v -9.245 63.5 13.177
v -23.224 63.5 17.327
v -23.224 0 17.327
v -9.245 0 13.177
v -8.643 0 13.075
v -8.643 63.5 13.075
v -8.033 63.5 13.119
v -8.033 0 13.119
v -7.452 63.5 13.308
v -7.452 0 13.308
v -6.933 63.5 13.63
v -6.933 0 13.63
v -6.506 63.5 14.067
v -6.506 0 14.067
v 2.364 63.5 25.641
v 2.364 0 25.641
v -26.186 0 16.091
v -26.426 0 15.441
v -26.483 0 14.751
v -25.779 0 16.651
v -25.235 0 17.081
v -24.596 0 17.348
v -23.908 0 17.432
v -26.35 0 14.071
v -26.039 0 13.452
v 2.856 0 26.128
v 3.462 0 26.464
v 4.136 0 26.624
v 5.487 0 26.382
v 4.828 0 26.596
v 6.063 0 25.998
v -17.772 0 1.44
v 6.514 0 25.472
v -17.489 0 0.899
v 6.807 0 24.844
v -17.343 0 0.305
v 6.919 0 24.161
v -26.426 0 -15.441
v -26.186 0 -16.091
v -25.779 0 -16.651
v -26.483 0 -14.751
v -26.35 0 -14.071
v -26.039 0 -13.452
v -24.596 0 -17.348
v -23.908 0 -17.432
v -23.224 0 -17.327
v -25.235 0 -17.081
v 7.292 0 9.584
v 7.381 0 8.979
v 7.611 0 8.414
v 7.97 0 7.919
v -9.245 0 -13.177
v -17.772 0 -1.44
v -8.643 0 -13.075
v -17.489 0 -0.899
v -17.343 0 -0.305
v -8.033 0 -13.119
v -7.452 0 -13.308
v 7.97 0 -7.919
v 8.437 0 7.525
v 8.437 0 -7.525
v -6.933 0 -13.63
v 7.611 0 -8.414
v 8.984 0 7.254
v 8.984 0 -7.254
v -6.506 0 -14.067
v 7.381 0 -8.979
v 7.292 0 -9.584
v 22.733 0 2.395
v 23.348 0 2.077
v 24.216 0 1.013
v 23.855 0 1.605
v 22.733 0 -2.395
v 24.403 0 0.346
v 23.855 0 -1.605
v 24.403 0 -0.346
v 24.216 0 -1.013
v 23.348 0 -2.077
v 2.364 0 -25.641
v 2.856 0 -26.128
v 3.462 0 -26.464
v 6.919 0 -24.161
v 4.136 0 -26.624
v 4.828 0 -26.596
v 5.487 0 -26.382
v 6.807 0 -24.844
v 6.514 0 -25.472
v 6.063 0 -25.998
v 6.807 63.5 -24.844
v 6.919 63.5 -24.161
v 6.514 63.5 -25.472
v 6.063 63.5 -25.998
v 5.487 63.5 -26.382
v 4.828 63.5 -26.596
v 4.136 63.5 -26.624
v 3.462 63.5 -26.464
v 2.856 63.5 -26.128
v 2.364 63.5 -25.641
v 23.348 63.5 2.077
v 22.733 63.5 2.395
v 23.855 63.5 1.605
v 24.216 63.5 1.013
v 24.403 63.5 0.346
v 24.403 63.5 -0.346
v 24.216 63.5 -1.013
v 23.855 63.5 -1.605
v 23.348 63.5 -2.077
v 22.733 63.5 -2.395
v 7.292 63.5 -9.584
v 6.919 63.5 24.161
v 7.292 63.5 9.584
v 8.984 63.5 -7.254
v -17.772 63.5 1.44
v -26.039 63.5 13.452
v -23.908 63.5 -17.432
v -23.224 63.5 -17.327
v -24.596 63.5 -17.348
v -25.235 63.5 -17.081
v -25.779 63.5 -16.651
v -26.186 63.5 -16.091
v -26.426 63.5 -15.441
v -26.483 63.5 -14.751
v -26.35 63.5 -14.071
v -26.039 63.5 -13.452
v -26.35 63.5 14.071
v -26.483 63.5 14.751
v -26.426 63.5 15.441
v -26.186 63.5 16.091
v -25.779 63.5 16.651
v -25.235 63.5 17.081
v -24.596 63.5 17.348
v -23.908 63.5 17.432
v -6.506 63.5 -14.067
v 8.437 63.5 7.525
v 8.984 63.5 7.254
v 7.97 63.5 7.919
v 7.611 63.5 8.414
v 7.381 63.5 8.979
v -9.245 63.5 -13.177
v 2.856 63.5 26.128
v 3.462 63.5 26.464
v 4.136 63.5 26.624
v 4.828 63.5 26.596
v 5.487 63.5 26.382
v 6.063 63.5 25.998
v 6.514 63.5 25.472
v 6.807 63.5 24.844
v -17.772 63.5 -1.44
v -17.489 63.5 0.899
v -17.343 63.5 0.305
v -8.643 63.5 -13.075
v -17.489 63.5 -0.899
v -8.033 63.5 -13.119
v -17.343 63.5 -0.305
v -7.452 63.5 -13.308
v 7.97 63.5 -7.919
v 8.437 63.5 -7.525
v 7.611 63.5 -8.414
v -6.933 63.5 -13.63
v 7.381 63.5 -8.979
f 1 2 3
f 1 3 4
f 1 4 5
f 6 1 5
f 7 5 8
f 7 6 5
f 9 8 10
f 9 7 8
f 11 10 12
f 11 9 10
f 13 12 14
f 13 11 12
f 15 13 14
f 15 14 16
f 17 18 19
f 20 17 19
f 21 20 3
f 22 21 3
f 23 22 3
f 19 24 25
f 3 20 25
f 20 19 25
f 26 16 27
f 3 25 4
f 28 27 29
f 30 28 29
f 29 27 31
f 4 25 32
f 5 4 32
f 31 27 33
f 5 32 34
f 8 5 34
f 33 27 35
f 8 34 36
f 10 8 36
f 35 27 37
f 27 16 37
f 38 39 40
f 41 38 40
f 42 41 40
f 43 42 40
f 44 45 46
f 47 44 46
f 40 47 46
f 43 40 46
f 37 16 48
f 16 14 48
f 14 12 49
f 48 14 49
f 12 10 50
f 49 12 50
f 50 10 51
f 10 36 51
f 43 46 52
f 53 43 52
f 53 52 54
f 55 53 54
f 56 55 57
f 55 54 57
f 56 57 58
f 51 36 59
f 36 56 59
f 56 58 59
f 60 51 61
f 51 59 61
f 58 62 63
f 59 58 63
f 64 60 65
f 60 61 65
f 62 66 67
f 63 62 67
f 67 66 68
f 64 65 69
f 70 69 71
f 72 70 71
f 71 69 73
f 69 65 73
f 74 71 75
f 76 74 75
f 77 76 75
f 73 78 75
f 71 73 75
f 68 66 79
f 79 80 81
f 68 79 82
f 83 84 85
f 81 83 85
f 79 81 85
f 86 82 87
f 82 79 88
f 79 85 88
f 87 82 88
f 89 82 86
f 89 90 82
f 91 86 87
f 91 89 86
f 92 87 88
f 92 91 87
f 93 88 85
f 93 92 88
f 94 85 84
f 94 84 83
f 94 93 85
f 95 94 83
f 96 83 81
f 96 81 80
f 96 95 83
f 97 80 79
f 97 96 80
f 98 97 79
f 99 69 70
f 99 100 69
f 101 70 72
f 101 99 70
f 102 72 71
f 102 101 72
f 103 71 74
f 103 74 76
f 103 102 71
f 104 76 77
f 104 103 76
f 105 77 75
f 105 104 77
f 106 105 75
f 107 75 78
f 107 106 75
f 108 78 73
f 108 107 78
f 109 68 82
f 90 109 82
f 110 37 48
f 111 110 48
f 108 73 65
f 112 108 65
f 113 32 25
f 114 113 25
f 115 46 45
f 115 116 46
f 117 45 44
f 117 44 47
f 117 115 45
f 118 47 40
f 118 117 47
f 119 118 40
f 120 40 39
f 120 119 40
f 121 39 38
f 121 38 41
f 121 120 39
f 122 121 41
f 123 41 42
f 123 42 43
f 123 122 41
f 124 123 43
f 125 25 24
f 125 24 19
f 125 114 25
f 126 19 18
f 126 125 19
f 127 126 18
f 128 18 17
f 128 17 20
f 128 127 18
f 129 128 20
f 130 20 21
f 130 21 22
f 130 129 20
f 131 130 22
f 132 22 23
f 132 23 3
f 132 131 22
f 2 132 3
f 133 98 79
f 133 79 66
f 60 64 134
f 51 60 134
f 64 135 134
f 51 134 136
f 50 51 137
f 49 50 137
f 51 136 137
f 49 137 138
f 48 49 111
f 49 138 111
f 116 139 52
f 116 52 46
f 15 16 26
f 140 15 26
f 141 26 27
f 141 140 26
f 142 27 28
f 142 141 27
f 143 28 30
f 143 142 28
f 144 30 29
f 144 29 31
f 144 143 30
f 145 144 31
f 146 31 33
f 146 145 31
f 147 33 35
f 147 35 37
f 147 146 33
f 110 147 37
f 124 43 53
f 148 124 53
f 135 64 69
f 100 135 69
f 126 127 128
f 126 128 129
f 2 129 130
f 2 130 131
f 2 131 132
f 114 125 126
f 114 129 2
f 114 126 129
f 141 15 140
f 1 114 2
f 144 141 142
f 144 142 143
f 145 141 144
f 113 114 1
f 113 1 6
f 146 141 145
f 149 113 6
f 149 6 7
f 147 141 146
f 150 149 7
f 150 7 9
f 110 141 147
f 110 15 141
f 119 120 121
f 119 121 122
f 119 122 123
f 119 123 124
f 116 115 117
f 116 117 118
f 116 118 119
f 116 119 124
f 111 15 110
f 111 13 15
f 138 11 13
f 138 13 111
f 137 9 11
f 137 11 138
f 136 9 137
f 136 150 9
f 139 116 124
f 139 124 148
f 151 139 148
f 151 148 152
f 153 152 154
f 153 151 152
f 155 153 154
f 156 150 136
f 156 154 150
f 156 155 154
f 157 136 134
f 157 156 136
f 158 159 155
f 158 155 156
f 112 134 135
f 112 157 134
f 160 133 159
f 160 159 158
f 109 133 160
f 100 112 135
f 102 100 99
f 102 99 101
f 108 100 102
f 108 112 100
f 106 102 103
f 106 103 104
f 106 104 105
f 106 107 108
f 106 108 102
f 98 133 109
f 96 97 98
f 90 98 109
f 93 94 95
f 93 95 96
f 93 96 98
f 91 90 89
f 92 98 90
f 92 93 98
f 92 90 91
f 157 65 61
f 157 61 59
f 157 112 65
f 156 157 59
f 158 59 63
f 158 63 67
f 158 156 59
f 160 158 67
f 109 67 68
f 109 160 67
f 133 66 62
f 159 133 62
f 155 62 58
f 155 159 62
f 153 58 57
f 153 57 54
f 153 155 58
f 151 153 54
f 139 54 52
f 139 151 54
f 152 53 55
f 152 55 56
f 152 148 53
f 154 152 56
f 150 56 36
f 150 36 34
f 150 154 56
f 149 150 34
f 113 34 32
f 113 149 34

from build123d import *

# Parameters (mm, degrees)
BOSS_EXTRUDE2_DEPTH      = 63.5
BOSS_EXTRUDE2_DEPTH_BACK = 0.000100076
FILLET2_R                = 2.54


with BuildPart() as part:
    # Sketch2 → Boss-Extrude2 (new, two sides: drawn at the far end of the back side and taken through both)
    with BuildSketch(Plane(origin=(0, 0, 0), x_dir=(1, 0, 0), z_dir=(0, 1, 0)).offset(-BOSS_EXTRUDE2_DEPTH_BACK)):
        Polygon((7.336319495, 7.83629969), (7.336319495, 0), (29.508870684, 0), align=None)
        Polygon((29.508870684, 0), (7.336319495, 0), (7.336319495, -7.83629969), align=None)
        Polygon((7.336319495, 0), (-3.449421721, 0), (-0.116444388, -10.257849467), (7.336319495, -7.83629969), align=None)
        Polygon((-0.116444388, 10.257849467), (-3.449421721, 0), (7.336319495, 0), (7.336319495, 7.83629969), align=None)
        Polygon((-12.175269662, 6.339699622), (-3.449421721, 0), (-0.116444388, 10.257849467), (-7.569208272, 12.679399244), align=None)
        Polygon((-12.175269662, -6.339699622), (-3.449421721, 0), (-12.175269662, 6.339699622), (-16.781331052, 0), align=None)
        Polygon((-0.116444388, -10.257849467), (-3.449421721, 0), (-12.175269662, -6.339699622), (-7.569208272, -12.679399244), align=None)
        Polygon((6.735250738, -31.345198758), (-0.116444388, -10.257849467), (-7.569208272, -12.679399244), align=None)
        Polygon((7.336319495, -7.83629969), (-0.116444388, -10.257849467), (6.735250738, -31.345198758), align=None)
        Polygon((-7.569208272, -12.679399244), (-12.175269662, -6.339699622), (-30.113240383, -19.372398217), align=None)
        Polygon((-30.113240383, -19.372398217), (-12.175269662, -6.339699622), (-16.781331052, 0), align=None)
        Polygon((-16.781331052, 0), (-12.175269662, 6.339699622), (-30.113240383, 19.372398217), align=None)
        Polygon((-30.113240383, 19.372398217), (-12.175269662, 6.339699622), (-7.569208272, 12.679399244), align=None)
        Polygon((-7.569208272, 12.679399244), (-0.116444388, 10.257849467), (6.735250738, 31.345198758), align=None)
        Polygon((6.735250738, 31.345198758), (-0.116444388, 10.257849467), (7.336319495, 7.83629969), align=None)
    extrude(amount=BOSS_EXTRUDE2_DEPTH + BOSS_EXTRUDE2_DEPTH_BACK)

    # Fillet2
    fillet2_edges = [part.edges().sort_by_distance(p)[0] for p in [
        (-16.781331052, 31.749949962, 0),
        (-30.113240383, 31.749949962, -19.372398217),
        (-7.569208272, 31.749949962, -12.679399244),
        (6.735250738, 31.749949962, -31.345198758),
        (7.336319495, 31.749949962, -7.83629969),
        (29.508870684, 31.749949962, 0),
        (7.336319495, 31.749949962, 7.83629969),
        (6.735250738, 31.749949962, 31.345198758),
        (-7.569208272, 31.749949962, 12.679399244),
        (-30.113240383, 31.749949962, 19.372398217),
    ]]
    fillet(fillet2_edges, radius=FILLET2_R)


solid = part.part
